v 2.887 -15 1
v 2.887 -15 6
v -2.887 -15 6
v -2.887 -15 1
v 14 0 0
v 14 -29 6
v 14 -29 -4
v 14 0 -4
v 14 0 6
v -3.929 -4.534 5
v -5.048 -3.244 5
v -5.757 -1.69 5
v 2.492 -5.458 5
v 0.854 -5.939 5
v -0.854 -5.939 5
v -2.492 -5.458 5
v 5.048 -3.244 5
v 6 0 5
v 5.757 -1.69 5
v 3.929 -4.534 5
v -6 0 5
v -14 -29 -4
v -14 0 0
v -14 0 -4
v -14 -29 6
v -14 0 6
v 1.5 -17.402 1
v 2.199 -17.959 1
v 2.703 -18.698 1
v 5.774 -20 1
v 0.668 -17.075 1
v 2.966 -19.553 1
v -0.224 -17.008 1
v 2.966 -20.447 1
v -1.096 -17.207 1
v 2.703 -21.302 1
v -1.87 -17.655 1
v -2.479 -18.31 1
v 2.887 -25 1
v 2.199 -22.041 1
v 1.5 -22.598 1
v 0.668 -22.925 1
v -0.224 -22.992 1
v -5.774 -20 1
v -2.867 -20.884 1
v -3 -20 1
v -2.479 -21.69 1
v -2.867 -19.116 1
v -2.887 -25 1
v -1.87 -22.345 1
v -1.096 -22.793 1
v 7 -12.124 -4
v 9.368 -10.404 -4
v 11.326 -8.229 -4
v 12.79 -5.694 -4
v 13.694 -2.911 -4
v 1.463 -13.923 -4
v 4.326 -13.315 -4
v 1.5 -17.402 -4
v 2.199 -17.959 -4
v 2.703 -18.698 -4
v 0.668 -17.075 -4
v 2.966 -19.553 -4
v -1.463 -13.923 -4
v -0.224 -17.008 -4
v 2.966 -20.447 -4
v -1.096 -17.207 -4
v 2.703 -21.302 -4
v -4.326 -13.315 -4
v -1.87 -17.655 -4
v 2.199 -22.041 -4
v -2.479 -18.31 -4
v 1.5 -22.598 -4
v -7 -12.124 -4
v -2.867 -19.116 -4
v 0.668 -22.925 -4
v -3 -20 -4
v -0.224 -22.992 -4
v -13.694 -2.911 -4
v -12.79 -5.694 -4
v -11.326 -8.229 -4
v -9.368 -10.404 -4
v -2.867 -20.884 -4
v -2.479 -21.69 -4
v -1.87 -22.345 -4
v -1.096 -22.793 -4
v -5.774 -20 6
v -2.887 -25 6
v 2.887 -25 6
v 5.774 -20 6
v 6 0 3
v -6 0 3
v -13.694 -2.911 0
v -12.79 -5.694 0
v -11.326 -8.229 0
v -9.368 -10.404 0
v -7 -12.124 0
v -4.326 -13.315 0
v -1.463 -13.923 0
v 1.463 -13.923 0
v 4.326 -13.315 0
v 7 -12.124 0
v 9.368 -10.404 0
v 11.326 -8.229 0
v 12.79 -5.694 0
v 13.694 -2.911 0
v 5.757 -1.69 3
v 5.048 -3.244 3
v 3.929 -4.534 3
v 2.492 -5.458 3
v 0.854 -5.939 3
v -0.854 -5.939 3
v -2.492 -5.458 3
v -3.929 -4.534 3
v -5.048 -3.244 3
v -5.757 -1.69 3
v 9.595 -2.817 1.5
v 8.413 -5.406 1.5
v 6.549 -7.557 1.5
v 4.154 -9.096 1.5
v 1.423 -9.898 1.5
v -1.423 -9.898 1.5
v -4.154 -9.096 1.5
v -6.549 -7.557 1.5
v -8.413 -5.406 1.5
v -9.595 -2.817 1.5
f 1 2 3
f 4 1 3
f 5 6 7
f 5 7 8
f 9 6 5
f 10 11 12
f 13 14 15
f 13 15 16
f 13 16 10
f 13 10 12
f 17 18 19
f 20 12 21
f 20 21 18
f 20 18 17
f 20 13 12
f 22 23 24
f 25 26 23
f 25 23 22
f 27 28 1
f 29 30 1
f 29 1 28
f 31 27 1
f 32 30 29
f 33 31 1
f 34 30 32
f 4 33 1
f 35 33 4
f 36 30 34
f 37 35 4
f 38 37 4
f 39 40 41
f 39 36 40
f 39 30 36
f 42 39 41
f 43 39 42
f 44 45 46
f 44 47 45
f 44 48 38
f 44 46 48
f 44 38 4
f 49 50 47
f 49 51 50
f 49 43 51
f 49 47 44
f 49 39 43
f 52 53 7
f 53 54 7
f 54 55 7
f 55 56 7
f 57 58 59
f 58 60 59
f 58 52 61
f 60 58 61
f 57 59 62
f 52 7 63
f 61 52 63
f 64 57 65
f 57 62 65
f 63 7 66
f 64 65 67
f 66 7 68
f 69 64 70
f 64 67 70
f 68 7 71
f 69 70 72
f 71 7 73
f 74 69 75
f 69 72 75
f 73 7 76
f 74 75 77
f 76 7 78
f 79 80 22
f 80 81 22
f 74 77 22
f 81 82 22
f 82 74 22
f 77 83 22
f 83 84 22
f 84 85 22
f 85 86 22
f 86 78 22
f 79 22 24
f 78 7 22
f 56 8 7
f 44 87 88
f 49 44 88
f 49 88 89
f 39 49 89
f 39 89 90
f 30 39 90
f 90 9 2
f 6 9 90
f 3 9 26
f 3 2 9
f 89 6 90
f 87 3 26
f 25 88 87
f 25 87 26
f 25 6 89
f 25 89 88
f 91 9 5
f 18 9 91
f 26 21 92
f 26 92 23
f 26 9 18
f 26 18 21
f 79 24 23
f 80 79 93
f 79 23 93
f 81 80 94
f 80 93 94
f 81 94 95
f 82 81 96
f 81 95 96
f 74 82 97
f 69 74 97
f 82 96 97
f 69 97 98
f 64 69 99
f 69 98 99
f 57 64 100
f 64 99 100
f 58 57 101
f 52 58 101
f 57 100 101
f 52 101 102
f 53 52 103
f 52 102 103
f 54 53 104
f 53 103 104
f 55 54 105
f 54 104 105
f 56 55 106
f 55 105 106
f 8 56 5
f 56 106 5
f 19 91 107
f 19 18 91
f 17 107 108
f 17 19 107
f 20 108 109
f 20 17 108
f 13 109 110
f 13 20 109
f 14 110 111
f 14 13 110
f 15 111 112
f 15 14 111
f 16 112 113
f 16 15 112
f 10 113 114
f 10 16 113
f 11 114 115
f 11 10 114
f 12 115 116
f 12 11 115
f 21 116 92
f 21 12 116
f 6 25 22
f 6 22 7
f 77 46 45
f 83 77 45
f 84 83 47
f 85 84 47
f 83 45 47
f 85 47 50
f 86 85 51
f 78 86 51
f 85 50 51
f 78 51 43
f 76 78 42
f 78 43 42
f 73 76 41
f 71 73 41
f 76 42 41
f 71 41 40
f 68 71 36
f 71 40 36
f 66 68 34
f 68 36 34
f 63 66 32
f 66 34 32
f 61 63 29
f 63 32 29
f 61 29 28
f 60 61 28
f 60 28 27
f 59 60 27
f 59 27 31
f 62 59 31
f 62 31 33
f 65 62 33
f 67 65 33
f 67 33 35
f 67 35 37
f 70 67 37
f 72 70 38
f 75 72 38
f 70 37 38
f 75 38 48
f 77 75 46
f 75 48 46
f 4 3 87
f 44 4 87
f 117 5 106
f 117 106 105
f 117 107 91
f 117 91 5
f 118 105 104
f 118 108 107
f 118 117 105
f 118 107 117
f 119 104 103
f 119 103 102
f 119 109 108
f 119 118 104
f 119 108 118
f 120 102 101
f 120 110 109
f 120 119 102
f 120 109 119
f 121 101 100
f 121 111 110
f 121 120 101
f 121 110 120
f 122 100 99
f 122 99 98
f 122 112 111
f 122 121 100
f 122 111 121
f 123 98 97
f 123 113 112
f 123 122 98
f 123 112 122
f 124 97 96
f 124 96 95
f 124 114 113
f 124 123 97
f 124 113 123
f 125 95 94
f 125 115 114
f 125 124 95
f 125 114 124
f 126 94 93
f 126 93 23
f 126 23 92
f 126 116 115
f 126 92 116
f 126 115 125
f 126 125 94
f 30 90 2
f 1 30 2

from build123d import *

# Parameters (mm, degrees)
REVOLUTION_ANGLE = -180
PAD011_DEPTH     = 10
POCKET002_DEPTH  = 5
SKETCH020_R      = 3
POCKET003_DEPTH  = 5


with BuildPart() as part:
    # Sketch017 → Revolution (revolve)
    with BuildSketch(Plane.XZ):
        Polygon((14, 0), (6, 3), (6, 5), (0, 5), (0, 6), (14, 6), align=None)
    revolve(axis=Axis((0, 0, 0), (0, 0, 1)), revolution_arc=REVOLUTION_ANGLE)

    # Sketch018 (on Face4 of Revolution) → Pad011 (new body)
    with BuildSketch(Plane(origin=(0, 0, 6), x_dir=(-1, 0, 0), z_dir=(0, 0, 1))):
        with BuildLine():
            Line((14, 0), (14, 29))
            Line((14, 29), (-14, 29))
            Line((-14, 29), (-14, 0))
            ThreePointArc((14, 0), (0, 14), (-14, 0))
        make_face()
    extrude(amount=-PAD011_DEPTH)

    # Sketch019 (on Face12 of Pad011) → Pocket002 (cut)
    with BuildSketch(Plane(origin=(0, 0, 6), x_dir=(-1, 0, 0), z_dir=(0, 0, 1))):
        Polygon((5.773503, 20), (2.886751, 25), (-2.886751, 25), (-5.773503, 20), (-2.886751, 15), (2.886751, 15), align=None)
    extrude(amount=-POCKET002_DEPTH, mode=Mode.SUBTRACT)

    # Sketch020 (on Face19 of Pocket002) → Pocket003 (cut)
    with BuildSketch(Plane(origin=(0, 0, 1), x_dir=(-1, 0, 0), z_dir=(0, 0, 1))):
        with Locations((0, 20)):
            Circle(SKETCH020_R)
    extrude(amount=-POCKET003_DEPTH, mode=Mode.SUBTRACT)


solid = part.part
